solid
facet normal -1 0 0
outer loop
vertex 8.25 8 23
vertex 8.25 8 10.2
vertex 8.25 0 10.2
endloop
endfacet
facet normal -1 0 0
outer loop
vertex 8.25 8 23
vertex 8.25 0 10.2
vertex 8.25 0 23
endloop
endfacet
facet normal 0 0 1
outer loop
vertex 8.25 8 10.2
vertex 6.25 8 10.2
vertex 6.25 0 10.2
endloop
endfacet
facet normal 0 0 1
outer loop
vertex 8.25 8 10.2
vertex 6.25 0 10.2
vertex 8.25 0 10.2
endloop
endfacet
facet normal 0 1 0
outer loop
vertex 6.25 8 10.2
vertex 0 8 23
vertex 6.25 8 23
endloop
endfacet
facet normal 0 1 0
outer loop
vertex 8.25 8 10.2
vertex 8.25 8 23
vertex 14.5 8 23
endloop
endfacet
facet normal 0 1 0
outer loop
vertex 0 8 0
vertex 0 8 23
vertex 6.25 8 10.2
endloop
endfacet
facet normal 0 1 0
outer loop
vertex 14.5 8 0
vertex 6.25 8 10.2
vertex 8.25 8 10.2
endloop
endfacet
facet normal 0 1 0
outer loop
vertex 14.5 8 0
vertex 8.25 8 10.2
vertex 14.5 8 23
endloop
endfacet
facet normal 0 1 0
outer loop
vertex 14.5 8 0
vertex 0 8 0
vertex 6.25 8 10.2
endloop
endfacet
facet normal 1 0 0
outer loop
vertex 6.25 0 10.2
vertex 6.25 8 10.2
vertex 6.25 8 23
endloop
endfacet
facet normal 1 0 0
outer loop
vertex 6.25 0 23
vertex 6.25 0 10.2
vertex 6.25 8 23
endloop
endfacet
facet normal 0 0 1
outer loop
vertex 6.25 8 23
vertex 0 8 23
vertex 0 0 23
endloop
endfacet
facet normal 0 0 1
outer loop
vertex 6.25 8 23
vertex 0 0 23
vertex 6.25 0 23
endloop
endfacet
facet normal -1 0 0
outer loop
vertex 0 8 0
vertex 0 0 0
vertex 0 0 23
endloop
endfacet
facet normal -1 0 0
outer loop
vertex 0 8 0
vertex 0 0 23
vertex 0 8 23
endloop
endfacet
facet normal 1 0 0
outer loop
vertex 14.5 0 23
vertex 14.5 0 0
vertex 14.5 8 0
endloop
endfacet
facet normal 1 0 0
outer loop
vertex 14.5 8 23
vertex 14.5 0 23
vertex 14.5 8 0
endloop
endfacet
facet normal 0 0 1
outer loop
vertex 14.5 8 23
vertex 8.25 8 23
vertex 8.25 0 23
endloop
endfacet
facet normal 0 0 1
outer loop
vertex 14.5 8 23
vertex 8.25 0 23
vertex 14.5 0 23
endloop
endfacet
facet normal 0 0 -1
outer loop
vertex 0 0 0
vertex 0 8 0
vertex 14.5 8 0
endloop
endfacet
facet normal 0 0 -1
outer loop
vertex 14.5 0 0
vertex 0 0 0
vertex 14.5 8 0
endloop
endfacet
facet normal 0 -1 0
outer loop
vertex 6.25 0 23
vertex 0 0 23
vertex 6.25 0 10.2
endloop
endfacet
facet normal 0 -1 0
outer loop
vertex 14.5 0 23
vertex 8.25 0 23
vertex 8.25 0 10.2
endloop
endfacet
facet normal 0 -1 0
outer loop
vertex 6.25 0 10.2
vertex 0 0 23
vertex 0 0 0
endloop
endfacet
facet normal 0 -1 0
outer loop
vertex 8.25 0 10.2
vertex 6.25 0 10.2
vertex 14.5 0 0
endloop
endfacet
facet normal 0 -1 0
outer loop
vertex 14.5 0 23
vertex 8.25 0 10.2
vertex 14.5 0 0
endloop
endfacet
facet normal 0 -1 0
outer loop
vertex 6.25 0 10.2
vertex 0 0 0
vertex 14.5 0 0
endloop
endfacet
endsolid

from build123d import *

# Parameters (mm, degrees)
SKETCH1_W               = 14.5
SKETCH1_H               = 8
BOSS_EXTRUDE1_DEPTH     = 23
CUT_EXTRUDE1_DEPTH      = 29.341665442
CUT_EXTRUDE1_DEPTH_BACK = 29.341665442
SKETCH2_W               = 2
SKETCH2_H               = 12.8


with BuildPart() as part:
    # Sketch1 → Boss-Extrude1 (new body)
    with BuildSketch(Plane.XY):
        with Locations((7.25, 4)):
            Rectangle(SKETCH1_W, SKETCH1_H)
    extrude(amount=BOSS_EXTRUDE1_DEPTH)

    # Sketch2 → Cut-Extrude1 (cut, two sides: drawn at the far end of the back side and taken through both)
    with BuildSketch(Plane.XZ.offset(-CUT_EXTRUDE1_DEPTH_BACK)):
        with Locations((7.25, 16.6)):
            Rectangle(SKETCH2_W, SKETCH2_H)
    extrude(amount=CUT_EXTRUDE1_DEPTH + CUT_EXTRUDE1_DEPTH_BACK, mode=Mode.SUBTRACT)


solid = part.part
